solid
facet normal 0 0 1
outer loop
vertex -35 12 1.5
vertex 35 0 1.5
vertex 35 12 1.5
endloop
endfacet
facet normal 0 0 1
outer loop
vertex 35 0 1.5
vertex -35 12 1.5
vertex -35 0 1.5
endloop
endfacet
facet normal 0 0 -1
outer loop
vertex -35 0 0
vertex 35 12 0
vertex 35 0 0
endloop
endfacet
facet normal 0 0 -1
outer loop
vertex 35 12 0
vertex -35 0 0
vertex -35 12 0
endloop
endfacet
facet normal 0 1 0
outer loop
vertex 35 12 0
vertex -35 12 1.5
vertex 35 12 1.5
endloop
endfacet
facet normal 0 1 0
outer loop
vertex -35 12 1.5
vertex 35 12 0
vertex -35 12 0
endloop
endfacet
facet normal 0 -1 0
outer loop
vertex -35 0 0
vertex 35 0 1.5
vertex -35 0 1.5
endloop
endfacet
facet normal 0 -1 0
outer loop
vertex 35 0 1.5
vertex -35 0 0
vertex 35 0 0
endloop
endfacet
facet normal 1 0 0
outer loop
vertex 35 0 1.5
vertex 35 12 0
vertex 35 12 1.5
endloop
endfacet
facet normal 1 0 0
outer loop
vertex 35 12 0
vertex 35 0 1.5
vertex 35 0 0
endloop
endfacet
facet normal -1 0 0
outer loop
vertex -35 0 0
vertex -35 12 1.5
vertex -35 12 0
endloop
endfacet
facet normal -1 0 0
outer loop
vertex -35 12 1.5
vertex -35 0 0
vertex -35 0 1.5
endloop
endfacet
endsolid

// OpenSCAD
// 10-well agarose gel comb, printed flat on the bed (Z = 0).
// All dimensions in millimetres.

// --- Named dimensions ---
plate_thick   = 1.5;   // Z thickness of the flat plate
spine_len     = 70;    // X length of the straight spine (back bar)
spine_width   = 12;    // Y width of the spine
tooth_width   = 5.0;   // X width of each rectangular tooth
tooth_len     = 12;    // Y length of each tooth (hangs in -Y from the spine)
gap           = 1.5;   // X gap between neighbouring teeth
n_tooth       = 10;    // number of teeth

// --- Derived values ---
// Total X span of the tooth row (10 teeth + 9 gaps)
row_span = n_tooth * tooth_width + (n_tooth - 1) * gap;

// X position of the left edge of the first tooth so the row is centred on the spine
x0 = -row_span / 2;

// Y position of the spine's front edge (teeth hang from this edge in -Y)
spine_front_y = spine_width / 2;

// Y position of the tooth tips (front edge of spine minus tooth length)
tooth_tip_y = spine_front_y - tooth_len;

// Shift the whole part in +Y so the spine stays centred on the origin in Y,
// while the teeth hang beyond the spine's front edge (they must not be inside it).
y_shift = -tooth_tip_y;

// --- Build the comb ---
$fn = 64;

translate([0, y_shift, 0])
union() {
    // Straight spine (back bar), centred on the origin in X and Y
    translate([-spine_len / 2, -spine_width / 2, 0])
        cube([spine_len, spine_width, plate_thick], center = false);

    // 10 rectangular teeth hanging in -Y from the spine's front edge
    for (i = [0 : n_tooth - 1]) {
        tx = x0 + i * (tooth_width + gap);   // left X edge of tooth i
        ty = tooth_tip_y;                    // front (tip) Y edge of tooth i
        translate([tx, ty, 0])
            cube([tooth_width, tooth_len, plate_thick], center = false);
    }
}
